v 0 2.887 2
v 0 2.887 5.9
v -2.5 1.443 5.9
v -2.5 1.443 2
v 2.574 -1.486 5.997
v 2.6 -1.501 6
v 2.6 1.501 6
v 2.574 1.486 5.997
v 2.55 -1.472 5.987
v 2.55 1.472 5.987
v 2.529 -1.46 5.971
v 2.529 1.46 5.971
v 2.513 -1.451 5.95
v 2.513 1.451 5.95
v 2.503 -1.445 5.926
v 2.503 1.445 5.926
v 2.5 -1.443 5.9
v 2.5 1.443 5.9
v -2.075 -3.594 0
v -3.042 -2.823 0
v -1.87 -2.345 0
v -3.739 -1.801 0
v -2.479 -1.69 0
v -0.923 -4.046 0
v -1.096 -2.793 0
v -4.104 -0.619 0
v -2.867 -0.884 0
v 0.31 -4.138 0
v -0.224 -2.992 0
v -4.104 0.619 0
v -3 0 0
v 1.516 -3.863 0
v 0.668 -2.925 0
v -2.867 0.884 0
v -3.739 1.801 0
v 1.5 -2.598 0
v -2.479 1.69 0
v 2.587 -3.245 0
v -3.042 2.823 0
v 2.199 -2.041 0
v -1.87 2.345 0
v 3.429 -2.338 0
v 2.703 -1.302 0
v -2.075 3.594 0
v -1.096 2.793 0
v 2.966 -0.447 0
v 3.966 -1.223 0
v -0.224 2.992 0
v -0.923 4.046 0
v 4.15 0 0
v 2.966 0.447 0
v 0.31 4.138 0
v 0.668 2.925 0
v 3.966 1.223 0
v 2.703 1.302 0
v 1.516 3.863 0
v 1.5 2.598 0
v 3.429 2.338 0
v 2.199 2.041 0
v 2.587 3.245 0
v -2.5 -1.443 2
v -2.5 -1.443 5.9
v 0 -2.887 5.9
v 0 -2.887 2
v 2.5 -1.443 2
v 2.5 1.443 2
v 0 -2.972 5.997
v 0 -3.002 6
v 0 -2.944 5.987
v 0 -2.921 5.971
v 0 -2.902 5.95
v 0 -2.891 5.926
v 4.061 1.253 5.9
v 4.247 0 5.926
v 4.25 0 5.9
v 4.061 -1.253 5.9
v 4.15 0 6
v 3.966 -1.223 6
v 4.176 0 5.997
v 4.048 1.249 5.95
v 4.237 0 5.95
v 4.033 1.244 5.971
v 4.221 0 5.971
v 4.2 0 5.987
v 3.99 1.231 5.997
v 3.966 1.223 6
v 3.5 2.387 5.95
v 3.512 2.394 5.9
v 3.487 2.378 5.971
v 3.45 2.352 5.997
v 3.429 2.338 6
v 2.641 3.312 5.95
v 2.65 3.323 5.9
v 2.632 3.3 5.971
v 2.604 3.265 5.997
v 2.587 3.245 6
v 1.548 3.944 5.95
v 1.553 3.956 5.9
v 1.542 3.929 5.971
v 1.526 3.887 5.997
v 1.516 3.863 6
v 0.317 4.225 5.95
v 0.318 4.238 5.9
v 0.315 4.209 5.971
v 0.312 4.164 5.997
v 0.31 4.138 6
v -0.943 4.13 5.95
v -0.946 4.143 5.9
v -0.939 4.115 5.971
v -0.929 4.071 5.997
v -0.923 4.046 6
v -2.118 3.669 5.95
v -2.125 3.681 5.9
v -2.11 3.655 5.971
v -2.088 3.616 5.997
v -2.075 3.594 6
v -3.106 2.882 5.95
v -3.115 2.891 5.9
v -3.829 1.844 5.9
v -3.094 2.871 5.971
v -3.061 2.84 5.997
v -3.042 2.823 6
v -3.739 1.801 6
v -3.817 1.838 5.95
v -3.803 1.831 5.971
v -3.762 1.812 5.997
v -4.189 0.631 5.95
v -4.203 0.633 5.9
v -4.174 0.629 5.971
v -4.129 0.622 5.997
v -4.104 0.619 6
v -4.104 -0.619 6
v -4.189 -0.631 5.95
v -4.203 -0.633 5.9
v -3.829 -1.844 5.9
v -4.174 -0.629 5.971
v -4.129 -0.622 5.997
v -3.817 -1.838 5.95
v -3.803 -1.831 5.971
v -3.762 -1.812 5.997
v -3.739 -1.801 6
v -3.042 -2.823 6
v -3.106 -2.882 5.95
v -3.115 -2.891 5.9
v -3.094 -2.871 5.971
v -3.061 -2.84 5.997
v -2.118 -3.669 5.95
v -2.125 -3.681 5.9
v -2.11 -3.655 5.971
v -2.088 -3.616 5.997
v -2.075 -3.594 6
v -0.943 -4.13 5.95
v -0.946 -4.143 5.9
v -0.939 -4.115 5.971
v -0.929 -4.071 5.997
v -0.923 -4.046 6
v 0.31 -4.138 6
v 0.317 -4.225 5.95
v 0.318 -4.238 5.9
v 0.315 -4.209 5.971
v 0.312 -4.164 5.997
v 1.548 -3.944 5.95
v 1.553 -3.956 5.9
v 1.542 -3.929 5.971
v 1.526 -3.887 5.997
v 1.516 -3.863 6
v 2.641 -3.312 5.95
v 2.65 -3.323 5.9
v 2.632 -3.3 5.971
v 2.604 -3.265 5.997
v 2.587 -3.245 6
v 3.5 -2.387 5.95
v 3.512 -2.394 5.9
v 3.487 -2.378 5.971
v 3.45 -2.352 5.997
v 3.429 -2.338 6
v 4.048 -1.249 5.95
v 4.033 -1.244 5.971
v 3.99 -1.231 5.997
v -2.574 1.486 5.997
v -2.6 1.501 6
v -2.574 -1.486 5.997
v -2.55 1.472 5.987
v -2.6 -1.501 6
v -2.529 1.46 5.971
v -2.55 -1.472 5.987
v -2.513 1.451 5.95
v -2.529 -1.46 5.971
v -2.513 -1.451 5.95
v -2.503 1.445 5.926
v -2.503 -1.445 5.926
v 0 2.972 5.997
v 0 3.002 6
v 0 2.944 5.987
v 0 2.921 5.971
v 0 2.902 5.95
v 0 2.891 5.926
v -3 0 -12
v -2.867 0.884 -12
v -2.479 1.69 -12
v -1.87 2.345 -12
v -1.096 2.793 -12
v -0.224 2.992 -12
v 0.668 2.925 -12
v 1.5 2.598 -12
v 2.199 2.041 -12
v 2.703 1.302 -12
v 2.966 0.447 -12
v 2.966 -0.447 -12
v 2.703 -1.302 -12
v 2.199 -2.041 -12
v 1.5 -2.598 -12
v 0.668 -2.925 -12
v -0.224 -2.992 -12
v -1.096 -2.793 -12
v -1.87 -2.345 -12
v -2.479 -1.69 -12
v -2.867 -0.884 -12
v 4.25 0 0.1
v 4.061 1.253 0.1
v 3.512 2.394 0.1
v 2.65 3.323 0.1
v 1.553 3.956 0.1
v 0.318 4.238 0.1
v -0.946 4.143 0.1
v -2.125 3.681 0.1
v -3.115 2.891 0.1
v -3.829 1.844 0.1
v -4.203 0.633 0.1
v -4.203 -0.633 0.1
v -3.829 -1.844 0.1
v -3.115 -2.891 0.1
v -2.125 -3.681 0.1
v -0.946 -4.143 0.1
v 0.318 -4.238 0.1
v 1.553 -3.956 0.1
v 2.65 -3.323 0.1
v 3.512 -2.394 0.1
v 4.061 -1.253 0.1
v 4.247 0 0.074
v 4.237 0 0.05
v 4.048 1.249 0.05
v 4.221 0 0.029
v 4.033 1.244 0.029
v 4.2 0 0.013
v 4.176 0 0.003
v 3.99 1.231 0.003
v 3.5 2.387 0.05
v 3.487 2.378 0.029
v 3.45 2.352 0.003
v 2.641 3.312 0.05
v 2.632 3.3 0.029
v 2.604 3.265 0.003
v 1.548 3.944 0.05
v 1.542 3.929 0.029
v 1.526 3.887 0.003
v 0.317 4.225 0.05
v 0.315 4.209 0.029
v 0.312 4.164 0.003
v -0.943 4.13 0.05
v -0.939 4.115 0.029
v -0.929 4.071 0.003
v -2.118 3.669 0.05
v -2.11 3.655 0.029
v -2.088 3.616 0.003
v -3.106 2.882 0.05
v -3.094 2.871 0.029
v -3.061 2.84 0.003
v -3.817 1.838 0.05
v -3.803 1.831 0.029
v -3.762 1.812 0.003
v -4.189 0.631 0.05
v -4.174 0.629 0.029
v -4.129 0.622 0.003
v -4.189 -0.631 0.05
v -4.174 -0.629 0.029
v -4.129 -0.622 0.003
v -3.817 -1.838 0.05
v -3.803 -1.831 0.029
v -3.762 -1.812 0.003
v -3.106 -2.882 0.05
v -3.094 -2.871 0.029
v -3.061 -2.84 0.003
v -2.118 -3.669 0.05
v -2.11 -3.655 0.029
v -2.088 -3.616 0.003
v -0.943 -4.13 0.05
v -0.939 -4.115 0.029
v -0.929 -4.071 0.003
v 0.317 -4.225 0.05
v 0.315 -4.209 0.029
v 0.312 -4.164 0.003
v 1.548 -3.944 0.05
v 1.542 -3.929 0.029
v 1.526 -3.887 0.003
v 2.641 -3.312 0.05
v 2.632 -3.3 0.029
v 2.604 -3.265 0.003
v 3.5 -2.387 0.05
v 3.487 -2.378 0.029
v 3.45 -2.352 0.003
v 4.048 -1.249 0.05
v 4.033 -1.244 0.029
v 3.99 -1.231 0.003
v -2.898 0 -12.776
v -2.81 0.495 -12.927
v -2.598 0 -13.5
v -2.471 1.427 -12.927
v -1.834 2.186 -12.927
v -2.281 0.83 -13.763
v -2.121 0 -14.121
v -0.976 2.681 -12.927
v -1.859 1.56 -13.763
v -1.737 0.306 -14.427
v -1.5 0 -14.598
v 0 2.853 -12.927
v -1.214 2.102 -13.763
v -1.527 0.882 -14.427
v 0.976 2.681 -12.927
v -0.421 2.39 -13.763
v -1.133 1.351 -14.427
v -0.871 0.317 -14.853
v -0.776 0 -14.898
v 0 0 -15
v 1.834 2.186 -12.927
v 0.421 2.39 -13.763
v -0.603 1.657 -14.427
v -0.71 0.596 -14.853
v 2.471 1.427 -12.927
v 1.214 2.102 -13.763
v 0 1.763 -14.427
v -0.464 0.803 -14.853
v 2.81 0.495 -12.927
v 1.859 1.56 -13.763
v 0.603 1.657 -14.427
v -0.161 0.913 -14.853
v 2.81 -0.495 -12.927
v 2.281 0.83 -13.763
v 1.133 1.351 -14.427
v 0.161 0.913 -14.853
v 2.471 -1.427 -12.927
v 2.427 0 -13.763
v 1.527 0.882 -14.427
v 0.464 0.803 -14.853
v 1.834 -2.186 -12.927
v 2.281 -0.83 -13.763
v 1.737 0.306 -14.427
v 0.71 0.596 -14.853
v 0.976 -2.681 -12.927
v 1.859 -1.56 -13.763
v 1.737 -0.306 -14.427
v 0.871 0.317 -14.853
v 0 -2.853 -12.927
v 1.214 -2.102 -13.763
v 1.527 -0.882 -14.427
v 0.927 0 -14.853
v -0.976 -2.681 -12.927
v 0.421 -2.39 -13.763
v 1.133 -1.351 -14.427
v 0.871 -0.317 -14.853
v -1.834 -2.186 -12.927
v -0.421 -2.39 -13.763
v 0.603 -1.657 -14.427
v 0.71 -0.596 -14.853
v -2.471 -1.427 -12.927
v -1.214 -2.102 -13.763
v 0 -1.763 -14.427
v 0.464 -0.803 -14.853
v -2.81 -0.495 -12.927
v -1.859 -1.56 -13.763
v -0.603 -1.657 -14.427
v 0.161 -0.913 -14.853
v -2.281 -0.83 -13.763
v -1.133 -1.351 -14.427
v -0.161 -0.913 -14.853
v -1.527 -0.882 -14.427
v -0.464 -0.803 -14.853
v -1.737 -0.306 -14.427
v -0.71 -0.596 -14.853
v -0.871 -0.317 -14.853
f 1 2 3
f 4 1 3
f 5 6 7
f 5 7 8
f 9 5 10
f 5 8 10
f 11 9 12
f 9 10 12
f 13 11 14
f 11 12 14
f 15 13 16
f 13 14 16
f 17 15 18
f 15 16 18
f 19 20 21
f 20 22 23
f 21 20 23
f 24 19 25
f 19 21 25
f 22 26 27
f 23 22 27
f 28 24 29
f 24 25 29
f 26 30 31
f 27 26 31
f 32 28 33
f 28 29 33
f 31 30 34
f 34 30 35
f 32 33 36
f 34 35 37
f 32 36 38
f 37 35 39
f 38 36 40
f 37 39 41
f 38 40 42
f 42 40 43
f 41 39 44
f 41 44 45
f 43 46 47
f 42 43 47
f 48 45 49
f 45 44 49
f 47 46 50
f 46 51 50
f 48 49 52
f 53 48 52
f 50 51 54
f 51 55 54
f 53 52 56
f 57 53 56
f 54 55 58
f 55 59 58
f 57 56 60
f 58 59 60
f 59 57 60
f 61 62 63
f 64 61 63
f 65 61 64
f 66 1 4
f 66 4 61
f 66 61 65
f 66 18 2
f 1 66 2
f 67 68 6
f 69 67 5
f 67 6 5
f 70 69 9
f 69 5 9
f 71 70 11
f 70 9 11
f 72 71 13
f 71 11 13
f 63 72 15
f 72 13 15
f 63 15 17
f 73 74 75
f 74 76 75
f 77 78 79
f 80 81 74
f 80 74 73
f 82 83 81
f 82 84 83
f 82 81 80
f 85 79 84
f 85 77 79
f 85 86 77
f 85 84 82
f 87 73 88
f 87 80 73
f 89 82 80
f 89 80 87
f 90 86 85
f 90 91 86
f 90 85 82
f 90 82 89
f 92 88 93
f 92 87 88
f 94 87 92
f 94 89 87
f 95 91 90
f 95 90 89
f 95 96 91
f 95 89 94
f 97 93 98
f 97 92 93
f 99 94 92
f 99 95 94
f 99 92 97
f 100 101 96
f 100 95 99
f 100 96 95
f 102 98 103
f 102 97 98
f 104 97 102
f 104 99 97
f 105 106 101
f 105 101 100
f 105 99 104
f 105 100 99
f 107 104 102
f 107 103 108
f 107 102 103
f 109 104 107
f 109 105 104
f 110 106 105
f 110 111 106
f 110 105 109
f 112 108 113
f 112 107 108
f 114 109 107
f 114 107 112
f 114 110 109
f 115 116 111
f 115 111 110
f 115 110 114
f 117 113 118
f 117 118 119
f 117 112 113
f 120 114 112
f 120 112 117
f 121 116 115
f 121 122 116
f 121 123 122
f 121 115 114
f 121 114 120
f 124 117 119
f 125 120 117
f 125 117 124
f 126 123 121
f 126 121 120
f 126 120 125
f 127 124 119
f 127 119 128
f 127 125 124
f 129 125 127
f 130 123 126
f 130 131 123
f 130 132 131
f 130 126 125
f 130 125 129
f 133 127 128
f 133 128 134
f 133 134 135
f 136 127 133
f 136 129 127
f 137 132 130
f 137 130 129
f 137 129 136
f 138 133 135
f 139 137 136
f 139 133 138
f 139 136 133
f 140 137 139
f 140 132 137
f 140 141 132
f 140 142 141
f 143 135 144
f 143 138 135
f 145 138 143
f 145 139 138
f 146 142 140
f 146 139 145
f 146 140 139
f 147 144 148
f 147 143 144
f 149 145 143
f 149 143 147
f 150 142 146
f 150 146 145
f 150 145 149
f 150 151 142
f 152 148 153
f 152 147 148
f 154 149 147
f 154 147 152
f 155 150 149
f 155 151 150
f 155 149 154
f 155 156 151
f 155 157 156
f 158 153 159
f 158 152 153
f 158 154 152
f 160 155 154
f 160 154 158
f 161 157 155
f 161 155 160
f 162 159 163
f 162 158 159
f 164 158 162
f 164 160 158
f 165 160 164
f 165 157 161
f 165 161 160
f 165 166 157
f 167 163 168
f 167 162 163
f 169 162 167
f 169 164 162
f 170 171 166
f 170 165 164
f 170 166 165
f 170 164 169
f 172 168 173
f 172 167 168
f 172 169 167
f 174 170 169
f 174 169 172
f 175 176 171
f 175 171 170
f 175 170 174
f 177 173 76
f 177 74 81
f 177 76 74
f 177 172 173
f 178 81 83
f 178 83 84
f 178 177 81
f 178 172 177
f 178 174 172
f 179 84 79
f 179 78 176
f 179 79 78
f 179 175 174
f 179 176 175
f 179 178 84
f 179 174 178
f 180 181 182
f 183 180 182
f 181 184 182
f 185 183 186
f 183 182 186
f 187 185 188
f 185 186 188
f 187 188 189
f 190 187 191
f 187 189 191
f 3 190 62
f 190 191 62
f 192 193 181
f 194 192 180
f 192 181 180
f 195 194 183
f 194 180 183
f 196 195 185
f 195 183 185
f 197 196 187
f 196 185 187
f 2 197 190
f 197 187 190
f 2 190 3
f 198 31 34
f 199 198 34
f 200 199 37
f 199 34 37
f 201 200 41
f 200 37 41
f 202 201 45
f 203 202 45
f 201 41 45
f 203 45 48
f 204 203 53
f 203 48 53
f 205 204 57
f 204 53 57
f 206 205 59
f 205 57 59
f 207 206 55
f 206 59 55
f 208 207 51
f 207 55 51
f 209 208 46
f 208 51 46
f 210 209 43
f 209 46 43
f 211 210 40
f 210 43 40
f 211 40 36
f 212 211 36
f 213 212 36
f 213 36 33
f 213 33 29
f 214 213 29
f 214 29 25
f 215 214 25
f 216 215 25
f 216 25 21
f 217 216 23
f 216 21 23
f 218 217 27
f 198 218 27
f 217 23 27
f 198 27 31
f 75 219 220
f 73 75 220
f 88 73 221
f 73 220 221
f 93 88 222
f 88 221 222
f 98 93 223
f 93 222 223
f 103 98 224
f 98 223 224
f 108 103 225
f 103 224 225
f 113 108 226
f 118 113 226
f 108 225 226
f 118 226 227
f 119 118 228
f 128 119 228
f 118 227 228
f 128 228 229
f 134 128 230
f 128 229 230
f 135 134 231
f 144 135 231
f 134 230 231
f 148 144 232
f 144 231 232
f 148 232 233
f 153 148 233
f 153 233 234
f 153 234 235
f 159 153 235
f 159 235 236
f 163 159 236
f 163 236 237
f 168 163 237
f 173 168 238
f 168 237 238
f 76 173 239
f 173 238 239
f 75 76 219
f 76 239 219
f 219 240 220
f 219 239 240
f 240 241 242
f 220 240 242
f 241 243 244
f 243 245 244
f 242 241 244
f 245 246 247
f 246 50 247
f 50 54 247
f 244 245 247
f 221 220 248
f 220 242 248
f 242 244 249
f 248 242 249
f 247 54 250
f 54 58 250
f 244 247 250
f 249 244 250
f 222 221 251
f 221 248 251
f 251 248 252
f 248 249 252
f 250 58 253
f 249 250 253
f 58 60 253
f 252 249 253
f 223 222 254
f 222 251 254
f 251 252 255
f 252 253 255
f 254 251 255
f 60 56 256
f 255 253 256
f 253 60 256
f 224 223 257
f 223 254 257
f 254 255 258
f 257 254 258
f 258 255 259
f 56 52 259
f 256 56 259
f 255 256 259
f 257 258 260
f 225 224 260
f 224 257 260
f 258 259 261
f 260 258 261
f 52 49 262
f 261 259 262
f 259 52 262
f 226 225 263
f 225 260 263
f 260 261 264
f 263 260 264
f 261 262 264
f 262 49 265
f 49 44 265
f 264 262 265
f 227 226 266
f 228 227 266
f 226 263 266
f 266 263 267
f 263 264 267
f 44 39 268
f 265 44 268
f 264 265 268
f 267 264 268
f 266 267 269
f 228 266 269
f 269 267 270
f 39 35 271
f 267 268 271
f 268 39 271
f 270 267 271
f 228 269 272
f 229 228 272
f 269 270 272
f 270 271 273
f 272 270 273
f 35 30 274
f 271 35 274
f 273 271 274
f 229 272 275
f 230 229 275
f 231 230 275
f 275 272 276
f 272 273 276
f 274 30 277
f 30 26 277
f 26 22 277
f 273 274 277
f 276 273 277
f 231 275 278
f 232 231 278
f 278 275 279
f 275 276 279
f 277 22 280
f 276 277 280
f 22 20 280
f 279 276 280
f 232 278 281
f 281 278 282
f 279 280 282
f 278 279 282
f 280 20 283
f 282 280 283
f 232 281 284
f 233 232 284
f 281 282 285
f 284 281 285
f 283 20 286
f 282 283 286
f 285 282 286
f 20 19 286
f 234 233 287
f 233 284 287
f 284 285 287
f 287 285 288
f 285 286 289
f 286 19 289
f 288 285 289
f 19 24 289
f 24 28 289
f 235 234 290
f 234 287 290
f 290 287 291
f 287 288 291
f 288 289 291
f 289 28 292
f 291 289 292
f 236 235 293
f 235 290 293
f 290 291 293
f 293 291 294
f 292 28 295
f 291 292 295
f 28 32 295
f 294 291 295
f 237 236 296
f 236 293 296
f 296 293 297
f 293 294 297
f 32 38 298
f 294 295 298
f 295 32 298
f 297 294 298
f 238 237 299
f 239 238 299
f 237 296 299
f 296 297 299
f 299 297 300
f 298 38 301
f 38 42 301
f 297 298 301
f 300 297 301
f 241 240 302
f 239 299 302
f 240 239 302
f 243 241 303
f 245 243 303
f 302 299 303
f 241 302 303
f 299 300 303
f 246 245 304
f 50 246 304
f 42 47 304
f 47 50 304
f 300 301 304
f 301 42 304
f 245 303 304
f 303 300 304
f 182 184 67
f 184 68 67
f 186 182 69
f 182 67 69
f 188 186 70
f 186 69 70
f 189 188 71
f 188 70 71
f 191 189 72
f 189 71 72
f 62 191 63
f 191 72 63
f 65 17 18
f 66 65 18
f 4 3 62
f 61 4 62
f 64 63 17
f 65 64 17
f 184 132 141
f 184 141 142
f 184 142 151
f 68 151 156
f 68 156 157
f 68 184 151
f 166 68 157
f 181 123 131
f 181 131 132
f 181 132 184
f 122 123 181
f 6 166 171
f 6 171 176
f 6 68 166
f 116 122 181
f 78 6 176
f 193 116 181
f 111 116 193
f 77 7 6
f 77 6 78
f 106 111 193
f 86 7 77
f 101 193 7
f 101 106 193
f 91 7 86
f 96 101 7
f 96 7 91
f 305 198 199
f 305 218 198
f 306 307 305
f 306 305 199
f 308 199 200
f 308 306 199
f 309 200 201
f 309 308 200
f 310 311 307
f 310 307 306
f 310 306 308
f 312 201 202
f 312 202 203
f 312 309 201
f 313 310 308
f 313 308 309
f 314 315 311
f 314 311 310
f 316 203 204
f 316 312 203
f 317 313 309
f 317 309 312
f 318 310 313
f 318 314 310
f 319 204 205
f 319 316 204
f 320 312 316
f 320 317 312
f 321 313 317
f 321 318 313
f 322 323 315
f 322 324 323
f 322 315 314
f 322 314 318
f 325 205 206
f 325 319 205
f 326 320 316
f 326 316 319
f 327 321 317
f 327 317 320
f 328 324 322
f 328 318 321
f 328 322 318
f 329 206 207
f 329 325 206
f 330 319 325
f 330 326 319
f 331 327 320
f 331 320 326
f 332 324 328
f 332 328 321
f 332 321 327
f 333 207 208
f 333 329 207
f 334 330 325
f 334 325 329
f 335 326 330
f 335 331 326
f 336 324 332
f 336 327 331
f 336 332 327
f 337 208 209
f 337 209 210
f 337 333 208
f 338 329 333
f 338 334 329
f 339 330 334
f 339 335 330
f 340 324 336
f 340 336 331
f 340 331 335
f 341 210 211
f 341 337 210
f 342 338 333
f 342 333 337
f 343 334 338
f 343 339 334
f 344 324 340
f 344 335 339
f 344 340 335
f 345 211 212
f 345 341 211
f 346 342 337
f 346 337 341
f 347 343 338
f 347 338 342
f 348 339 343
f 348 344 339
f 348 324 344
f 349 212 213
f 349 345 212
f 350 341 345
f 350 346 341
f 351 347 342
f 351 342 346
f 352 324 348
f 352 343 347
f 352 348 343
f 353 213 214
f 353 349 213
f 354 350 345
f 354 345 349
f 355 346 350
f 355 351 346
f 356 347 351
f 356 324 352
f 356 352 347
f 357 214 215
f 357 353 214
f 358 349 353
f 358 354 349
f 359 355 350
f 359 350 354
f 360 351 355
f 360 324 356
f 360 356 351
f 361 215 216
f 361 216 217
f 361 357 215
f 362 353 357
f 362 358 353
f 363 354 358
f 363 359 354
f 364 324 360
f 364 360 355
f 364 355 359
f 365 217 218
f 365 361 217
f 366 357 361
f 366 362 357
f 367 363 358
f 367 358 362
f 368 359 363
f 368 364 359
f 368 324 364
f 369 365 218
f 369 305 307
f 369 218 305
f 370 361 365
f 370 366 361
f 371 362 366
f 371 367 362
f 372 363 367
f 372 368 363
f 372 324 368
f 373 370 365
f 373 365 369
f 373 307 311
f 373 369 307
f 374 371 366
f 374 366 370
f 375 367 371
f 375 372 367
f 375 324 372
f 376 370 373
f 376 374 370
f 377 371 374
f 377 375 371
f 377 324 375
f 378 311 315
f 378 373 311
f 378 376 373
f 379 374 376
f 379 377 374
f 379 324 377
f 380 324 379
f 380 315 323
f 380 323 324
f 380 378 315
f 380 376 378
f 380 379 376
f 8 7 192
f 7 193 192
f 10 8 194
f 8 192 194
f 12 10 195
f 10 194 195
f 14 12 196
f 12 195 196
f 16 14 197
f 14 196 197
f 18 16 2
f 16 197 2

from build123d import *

# Parameters (mm, degrees)
SKETCH1_R           = 4.25
BOSS_EXTRUDE1_DEPTH = 6
CUT_EXTRUDE1_DEPTH  = 4
SKETCH3_R           = 3
BOSS_EXTRUDE2_DEPTH = 15
FILLET1_R           = 0.1
FILLET2_R           = 3


with BuildPart() as part:
    # Sketch1 → Boss-Extrude1 (new body)
    with BuildSketch(Plane.XY):
        Circle(SKETCH1_R)
    extrude(amount=BOSS_EXTRUDE1_DEPTH)

    # Sketch2 → Cut-Extrude1 (cut)
    with BuildSketch(Plane.XY.offset(6)):
        Polygon((0, 2.886751346), (-2.5, 1.443375673), (-2.5, -1.443375673), (0, -2.886751346), (2.5, -1.443375673), (2.5, 1.443375673), align=None)
    extrude(amount=-CUT_EXTRUDE1_DEPTH, mode=Mode.SUBTRACT)

    # Sketch3 → Boss-Extrude2 (add)
    with BuildSketch(Plane(origin=(0, 0, 0), x_dir=(-1, 0, 0), z_dir=(0, 0, -1))):
        Circle(SKETCH3_R)
    extrude(amount=BOSS_EXTRUDE2_DEPTH)

    # Fillet1
    fillet1_edges = [part.edges().sort_by_distance(p)[0] for p in [
        (1.25, 2.165063509, 6),
        (-1.25, 2.165063509, 6),
        (-2.5, 0, 6),
        (-1.25, -2.165063509, 6),
        (1.25, -2.165063509, 6),
        (2.5, 0, 6),
        (-4.25, 0, 0),
        (-4.25, 0, 6),
    ]]
    fillet(fillet1_edges, radius=FILLET1_R)

    # Fillet2
    fillet2_edges = [part.edges().sort_by_distance(p)[0] for p in [
        (3, 0, -15),
    ]]
    fillet(fillet2_edges, radius=FILLET2_R)


solid = part.part
